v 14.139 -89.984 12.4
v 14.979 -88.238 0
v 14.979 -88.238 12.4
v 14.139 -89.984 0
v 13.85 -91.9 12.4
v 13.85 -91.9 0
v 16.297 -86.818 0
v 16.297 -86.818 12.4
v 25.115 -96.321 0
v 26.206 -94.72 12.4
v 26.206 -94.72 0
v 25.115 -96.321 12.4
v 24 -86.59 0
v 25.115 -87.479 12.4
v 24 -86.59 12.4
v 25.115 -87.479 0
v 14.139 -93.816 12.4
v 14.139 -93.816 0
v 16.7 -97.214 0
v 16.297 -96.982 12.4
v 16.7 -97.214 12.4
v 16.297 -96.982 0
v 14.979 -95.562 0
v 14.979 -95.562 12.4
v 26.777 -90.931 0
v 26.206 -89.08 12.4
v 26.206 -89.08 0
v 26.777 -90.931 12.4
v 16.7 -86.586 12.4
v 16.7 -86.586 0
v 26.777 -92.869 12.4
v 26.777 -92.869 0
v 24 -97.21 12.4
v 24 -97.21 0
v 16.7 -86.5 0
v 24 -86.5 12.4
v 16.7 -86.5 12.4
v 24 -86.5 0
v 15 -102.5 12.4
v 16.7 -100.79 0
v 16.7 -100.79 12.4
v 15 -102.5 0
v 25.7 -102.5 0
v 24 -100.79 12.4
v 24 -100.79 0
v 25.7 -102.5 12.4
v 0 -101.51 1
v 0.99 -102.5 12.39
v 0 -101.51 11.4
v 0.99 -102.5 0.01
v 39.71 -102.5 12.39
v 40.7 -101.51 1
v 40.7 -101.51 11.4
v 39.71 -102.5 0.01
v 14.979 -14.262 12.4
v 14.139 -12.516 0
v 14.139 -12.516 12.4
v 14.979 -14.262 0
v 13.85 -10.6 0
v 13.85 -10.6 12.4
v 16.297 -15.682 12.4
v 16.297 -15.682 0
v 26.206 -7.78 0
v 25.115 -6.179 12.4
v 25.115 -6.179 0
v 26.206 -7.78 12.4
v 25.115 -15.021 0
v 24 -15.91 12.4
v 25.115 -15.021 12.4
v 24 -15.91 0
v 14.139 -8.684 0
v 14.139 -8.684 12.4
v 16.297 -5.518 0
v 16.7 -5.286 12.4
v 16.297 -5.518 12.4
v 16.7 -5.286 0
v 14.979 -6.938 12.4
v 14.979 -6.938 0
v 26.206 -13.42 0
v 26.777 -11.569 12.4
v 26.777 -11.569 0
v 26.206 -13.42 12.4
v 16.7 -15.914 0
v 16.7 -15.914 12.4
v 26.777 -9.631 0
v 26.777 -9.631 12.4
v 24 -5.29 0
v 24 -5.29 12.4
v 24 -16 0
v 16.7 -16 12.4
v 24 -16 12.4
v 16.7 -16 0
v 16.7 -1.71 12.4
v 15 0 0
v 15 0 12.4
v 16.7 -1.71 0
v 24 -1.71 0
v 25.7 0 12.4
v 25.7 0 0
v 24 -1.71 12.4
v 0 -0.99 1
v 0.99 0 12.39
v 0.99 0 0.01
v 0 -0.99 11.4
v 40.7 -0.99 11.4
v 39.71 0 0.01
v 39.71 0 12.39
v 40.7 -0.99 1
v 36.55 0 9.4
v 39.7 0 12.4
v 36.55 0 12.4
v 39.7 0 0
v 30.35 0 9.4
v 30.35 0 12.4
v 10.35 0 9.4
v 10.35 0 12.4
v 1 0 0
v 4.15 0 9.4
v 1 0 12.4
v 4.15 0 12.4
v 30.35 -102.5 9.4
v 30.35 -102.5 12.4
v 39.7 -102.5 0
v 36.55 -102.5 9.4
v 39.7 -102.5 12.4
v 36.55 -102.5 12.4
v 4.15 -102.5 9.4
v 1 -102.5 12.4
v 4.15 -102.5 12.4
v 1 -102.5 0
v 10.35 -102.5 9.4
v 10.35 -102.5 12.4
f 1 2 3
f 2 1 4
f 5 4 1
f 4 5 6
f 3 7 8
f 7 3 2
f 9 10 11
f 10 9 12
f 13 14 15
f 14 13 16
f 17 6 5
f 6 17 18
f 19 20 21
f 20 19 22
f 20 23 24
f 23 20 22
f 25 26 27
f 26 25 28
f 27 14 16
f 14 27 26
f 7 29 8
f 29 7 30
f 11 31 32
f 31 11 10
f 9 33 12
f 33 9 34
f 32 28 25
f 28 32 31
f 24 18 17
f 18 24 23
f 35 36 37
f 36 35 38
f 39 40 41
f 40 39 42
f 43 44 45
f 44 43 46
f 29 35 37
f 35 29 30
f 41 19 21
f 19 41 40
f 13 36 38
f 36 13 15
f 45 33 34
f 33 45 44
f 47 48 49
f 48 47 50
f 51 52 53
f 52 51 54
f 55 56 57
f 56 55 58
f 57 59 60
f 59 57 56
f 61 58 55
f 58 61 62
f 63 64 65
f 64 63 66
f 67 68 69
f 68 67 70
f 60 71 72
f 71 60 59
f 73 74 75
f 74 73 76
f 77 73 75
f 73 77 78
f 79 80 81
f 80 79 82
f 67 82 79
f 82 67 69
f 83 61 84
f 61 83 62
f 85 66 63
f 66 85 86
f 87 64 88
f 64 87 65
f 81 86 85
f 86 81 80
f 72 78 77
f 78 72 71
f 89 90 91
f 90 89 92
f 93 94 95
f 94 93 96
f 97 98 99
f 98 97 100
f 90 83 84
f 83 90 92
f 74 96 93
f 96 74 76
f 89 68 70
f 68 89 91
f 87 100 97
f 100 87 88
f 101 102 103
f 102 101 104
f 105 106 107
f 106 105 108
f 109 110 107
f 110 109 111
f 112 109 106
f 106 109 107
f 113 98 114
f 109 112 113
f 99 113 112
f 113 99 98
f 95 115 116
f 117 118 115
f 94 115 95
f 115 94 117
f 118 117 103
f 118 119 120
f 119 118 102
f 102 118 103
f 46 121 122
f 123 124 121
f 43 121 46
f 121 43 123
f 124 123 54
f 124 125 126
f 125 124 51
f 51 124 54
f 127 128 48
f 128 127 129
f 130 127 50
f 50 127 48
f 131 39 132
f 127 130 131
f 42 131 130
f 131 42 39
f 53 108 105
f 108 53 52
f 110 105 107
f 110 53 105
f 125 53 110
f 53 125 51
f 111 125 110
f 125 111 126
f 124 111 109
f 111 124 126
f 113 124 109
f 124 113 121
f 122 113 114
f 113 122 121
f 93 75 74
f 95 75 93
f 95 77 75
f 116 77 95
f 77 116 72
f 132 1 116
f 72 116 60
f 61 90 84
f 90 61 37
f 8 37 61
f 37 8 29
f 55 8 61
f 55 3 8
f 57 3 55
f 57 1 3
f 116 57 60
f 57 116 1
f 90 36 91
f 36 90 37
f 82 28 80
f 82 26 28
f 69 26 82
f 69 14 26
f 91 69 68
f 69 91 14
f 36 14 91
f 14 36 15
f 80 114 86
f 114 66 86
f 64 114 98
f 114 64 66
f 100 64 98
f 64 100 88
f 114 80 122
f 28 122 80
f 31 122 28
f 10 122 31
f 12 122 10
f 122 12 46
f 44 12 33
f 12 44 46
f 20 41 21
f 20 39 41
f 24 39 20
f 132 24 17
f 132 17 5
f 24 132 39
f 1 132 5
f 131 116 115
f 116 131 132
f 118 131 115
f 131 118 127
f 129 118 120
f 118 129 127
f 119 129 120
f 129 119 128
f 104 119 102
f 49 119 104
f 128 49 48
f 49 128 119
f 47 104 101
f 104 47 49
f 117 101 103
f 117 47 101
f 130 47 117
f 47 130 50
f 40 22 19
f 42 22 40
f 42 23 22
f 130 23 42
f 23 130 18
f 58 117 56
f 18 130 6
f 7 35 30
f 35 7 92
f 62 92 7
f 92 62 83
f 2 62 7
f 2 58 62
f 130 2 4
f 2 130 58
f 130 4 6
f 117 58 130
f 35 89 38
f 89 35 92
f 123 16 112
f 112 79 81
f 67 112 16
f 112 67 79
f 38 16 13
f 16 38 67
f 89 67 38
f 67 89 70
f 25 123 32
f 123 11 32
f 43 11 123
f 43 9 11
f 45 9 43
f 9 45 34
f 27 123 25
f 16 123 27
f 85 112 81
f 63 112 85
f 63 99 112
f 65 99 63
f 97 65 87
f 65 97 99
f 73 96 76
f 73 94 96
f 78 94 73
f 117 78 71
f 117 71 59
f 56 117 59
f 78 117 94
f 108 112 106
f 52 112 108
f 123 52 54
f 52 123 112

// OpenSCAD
include <lib/brio.scad>

//brio_straight(LENGTH);
//brio_straight((3/4)*LENGTH);
brio_straight((1/2)*LENGTH);
//brio_straight((1/4)*LENGTH);
//brio_curved(ROUND_R, 8); // inner radius, Nth part
//brio_curved(ROUND_R, 16); // inner radius, Nth part
//brio_bridge();
//brio_cross(LENGTH/2);
//brio_splitter();
//brio_splitter_round();
//brio_support();
//brio_tunnel();
//brio_connector(CONN_LEN);
